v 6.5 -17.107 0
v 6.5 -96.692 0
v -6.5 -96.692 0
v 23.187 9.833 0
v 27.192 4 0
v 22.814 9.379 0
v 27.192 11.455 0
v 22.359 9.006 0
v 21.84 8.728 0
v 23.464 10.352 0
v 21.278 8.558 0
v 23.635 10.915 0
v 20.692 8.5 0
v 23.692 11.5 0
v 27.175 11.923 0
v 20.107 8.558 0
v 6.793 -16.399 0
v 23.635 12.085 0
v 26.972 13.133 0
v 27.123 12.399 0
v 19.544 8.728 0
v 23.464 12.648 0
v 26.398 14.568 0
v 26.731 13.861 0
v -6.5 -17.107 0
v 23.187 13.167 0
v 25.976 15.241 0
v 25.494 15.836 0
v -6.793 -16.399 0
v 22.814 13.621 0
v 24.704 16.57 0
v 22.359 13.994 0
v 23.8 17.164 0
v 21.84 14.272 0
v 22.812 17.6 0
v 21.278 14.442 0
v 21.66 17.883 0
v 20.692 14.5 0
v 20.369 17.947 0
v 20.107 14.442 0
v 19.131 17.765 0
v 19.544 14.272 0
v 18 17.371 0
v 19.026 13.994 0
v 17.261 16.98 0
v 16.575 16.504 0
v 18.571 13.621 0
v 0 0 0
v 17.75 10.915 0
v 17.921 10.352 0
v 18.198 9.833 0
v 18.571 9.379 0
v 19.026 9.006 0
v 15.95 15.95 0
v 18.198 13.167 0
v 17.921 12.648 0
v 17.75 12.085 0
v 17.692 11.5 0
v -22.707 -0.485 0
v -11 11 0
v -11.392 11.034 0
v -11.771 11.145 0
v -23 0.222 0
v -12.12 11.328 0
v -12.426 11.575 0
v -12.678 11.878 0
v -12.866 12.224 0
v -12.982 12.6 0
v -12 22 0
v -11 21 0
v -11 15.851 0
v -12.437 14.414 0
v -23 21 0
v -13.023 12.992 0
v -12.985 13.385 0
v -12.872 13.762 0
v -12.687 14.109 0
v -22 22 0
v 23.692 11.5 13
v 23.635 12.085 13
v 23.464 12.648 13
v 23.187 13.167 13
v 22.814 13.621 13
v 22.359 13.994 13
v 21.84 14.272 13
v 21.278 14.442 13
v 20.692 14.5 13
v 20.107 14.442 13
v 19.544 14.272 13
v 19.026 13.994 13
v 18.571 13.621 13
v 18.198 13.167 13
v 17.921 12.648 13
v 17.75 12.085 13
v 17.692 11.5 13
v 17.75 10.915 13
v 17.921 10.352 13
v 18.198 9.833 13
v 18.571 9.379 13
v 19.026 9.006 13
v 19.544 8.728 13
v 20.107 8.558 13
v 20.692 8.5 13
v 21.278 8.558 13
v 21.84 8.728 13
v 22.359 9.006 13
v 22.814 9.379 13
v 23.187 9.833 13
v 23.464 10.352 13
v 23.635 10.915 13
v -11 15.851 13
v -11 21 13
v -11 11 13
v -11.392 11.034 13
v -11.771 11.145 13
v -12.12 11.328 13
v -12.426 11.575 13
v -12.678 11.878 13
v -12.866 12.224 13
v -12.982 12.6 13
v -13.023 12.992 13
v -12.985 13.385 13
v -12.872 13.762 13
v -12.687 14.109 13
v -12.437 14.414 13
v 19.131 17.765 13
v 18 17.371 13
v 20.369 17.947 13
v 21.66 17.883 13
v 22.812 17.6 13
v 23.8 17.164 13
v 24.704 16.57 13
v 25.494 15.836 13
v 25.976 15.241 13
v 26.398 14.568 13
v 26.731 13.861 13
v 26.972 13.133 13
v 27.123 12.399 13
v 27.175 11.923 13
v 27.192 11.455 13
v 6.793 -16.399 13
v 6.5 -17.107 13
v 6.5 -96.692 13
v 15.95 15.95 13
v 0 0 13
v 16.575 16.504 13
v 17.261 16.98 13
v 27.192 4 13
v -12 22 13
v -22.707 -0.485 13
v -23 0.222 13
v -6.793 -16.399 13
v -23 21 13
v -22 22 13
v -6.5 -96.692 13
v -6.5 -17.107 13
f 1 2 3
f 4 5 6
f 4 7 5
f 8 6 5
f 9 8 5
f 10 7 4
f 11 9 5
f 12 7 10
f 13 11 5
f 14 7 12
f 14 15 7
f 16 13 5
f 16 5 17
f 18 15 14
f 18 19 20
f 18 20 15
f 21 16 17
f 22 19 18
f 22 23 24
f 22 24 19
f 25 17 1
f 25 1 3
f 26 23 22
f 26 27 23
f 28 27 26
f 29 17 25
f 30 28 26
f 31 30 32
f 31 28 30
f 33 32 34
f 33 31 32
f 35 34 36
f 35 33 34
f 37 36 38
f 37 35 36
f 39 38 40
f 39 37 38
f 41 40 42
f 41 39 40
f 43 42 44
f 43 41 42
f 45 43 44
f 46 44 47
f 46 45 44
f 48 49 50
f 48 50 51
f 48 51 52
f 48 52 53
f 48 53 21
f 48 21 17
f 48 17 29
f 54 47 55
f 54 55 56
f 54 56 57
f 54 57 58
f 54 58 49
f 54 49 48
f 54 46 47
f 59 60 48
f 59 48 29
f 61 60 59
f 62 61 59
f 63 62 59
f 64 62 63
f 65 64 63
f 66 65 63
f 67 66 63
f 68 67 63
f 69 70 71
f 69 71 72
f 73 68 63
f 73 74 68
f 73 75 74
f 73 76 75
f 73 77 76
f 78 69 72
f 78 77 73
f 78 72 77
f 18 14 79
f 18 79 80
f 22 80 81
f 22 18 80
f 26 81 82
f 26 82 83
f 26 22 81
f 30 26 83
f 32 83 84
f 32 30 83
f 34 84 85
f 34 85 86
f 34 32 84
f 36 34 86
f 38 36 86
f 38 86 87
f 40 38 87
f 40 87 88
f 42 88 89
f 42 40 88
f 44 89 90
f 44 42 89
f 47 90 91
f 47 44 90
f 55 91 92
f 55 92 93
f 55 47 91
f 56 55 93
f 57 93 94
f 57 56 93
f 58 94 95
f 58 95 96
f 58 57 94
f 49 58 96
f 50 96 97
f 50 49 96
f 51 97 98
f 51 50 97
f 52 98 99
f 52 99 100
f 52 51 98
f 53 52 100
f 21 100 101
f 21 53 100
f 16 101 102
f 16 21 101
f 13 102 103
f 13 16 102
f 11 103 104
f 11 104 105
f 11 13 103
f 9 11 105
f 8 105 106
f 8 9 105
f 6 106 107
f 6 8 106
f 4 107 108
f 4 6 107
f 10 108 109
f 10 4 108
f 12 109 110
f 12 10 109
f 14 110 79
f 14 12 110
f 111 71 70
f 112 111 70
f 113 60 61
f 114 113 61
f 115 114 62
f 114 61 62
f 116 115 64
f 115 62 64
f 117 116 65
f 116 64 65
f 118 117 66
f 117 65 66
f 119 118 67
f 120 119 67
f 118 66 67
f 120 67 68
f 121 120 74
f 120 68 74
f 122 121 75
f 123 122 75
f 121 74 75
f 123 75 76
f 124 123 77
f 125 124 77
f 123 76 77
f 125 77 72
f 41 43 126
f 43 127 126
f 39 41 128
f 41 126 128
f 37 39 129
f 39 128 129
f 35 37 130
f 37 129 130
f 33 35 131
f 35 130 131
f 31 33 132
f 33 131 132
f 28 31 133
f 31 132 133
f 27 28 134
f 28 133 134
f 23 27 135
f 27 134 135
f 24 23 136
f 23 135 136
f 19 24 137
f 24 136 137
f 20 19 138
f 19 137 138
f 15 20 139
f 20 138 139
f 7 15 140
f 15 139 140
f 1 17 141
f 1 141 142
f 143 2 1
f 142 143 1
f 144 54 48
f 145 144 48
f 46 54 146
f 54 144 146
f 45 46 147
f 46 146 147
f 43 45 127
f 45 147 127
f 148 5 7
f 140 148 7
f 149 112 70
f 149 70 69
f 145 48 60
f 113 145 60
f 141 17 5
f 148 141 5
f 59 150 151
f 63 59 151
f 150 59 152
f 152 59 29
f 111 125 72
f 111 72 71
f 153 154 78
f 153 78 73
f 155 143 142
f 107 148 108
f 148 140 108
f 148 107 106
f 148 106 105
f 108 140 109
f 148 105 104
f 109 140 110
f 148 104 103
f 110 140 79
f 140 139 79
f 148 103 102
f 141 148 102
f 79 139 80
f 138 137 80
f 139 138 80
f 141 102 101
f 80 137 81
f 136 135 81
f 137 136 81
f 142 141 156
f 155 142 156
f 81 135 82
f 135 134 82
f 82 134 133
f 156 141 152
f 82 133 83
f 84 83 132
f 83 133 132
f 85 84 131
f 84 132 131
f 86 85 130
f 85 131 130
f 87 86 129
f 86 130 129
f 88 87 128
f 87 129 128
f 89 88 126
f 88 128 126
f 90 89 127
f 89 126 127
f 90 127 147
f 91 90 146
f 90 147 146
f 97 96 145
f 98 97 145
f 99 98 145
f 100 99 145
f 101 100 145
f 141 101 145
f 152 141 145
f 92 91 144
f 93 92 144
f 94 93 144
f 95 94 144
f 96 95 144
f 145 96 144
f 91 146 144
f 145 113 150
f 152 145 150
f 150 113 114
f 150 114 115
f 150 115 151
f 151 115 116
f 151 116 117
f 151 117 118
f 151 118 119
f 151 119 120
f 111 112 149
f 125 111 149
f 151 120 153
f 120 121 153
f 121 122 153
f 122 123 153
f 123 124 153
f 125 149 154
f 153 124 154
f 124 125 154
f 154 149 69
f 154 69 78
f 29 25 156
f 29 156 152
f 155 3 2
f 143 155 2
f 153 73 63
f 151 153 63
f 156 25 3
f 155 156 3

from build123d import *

# Parameters (mm, degrees)
F0_R        = 3
F1_DEPTH    = 13
F2_R        = 7
F3_R        = 6.5
F4_T1_DEPTH = 13
F4_T3_DEPTH = 18.1433659759
F4_T5_DEPTH = 15.2571417204


# Not quite as in the source:
# - a fillet or chamfer that OpenCascade refuses, or shapes differently, is made with other operations: its cross-section is extruded or revolved along the edge and cut away or added


with BuildPart() as f1:
    # F0 (on Top) → F1 (new body)
    with BuildSketch(Plane.XY):
        with BuildLine():
            Line((18, 18), (0, 0))
            Line((0, 0), (-11, 11))
            ThreePointArc((-11, 11), (-12.8659446975, 12.2241130817), (-12.4367385267, 14.4140867148))
            Line((-12.4367385267, 14.4140867148), (-11, 15.8508252416))
            Line((-11, 15.8508252416), (-11, 21.9997463049))
            Line((-11, 21.9997463049), (-23, 21.9997463049))
            Line((-23, 21.9997463049), (-23, -0.1923881554))
            Line((-23, -0.1923881554), (-6.5, -16.6923881554))
            Line((-6.5, -16.6923881554), (-6.5, -96.6923881554))
            Line((-6.5, -96.6923881554), (6.5, -96.6923881554))
            Line((6.5, -96.6923881554), (6.5, -16.6923881554))
            Line((6.5, -16.6923881554), (27.1923881554, 4))
            Line((27.1923881554, 4), (27.1923881554, 18))
            Line((27.1923881554, 18), (18, 18))
        make_face()
        with Locations((20.6923881554, 11.5)):
            Circle(F0_R, mode=Mode.SUBTRACT)
    extrude(amount=F1_DEPTH)

    # F2
    f2_edges = [f1.edges().sort_by_distance(p)[0] for p in [
        (18, 18, 6.5),
    ]]
    fillet(f2_edges, radius=F2_R)

    # F3
    f3_edges = [f1.edges().sort_by_distance(p)[0] for p in [
        (27.192388, 18, 6.5),
    ]]
    fillet(f3_edges, radius=F3_R)

    # F4: chamfer of 1 on 5 edges, made by hand

    # F4_s2 → F4_t1 (join)
    with BuildSketch(Plane.XY):
        Polygon((-6.5, -17.1066017178), (-6.7928932188, -16.3994949366), (-6.5, -16.6923881554), align=None)
        Polygon((6.7928932188, -16.3994949366), (6.5, -17.1066017178), (6.5, -16.6923881554), align=None)
    extrude(amount=F4_T1_DEPTH)

    # F4_s4 → F4_t3 (cut)
    with BuildSketch(Plane.XY.offset(-2.571682988)):
        Polygon((-11, 20.9997463049), (-12, 21.9997463049), (-11, 21.9997463049), align=None)
        Polygon((-22, 21.9997463049), (-23, 20.9997463049), (-23, 21.9997463049), align=None)
    extrude(amount=F4_T3_DEPTH, mode=Mode.SUBTRACT)

    # F4_s6 → F4_t5 (cut)
    with BuildSketch(Plane.XY.offset(-1.1285708602)):
        Polygon((-22.7071067812, -0.4852813742), (-23, 0.2218254069), (-23, -0.1923881554), align=None)
    extrude(amount=F4_T5_DEPTH, mode=Mode.SUBTRACT)


solid = f1.part
